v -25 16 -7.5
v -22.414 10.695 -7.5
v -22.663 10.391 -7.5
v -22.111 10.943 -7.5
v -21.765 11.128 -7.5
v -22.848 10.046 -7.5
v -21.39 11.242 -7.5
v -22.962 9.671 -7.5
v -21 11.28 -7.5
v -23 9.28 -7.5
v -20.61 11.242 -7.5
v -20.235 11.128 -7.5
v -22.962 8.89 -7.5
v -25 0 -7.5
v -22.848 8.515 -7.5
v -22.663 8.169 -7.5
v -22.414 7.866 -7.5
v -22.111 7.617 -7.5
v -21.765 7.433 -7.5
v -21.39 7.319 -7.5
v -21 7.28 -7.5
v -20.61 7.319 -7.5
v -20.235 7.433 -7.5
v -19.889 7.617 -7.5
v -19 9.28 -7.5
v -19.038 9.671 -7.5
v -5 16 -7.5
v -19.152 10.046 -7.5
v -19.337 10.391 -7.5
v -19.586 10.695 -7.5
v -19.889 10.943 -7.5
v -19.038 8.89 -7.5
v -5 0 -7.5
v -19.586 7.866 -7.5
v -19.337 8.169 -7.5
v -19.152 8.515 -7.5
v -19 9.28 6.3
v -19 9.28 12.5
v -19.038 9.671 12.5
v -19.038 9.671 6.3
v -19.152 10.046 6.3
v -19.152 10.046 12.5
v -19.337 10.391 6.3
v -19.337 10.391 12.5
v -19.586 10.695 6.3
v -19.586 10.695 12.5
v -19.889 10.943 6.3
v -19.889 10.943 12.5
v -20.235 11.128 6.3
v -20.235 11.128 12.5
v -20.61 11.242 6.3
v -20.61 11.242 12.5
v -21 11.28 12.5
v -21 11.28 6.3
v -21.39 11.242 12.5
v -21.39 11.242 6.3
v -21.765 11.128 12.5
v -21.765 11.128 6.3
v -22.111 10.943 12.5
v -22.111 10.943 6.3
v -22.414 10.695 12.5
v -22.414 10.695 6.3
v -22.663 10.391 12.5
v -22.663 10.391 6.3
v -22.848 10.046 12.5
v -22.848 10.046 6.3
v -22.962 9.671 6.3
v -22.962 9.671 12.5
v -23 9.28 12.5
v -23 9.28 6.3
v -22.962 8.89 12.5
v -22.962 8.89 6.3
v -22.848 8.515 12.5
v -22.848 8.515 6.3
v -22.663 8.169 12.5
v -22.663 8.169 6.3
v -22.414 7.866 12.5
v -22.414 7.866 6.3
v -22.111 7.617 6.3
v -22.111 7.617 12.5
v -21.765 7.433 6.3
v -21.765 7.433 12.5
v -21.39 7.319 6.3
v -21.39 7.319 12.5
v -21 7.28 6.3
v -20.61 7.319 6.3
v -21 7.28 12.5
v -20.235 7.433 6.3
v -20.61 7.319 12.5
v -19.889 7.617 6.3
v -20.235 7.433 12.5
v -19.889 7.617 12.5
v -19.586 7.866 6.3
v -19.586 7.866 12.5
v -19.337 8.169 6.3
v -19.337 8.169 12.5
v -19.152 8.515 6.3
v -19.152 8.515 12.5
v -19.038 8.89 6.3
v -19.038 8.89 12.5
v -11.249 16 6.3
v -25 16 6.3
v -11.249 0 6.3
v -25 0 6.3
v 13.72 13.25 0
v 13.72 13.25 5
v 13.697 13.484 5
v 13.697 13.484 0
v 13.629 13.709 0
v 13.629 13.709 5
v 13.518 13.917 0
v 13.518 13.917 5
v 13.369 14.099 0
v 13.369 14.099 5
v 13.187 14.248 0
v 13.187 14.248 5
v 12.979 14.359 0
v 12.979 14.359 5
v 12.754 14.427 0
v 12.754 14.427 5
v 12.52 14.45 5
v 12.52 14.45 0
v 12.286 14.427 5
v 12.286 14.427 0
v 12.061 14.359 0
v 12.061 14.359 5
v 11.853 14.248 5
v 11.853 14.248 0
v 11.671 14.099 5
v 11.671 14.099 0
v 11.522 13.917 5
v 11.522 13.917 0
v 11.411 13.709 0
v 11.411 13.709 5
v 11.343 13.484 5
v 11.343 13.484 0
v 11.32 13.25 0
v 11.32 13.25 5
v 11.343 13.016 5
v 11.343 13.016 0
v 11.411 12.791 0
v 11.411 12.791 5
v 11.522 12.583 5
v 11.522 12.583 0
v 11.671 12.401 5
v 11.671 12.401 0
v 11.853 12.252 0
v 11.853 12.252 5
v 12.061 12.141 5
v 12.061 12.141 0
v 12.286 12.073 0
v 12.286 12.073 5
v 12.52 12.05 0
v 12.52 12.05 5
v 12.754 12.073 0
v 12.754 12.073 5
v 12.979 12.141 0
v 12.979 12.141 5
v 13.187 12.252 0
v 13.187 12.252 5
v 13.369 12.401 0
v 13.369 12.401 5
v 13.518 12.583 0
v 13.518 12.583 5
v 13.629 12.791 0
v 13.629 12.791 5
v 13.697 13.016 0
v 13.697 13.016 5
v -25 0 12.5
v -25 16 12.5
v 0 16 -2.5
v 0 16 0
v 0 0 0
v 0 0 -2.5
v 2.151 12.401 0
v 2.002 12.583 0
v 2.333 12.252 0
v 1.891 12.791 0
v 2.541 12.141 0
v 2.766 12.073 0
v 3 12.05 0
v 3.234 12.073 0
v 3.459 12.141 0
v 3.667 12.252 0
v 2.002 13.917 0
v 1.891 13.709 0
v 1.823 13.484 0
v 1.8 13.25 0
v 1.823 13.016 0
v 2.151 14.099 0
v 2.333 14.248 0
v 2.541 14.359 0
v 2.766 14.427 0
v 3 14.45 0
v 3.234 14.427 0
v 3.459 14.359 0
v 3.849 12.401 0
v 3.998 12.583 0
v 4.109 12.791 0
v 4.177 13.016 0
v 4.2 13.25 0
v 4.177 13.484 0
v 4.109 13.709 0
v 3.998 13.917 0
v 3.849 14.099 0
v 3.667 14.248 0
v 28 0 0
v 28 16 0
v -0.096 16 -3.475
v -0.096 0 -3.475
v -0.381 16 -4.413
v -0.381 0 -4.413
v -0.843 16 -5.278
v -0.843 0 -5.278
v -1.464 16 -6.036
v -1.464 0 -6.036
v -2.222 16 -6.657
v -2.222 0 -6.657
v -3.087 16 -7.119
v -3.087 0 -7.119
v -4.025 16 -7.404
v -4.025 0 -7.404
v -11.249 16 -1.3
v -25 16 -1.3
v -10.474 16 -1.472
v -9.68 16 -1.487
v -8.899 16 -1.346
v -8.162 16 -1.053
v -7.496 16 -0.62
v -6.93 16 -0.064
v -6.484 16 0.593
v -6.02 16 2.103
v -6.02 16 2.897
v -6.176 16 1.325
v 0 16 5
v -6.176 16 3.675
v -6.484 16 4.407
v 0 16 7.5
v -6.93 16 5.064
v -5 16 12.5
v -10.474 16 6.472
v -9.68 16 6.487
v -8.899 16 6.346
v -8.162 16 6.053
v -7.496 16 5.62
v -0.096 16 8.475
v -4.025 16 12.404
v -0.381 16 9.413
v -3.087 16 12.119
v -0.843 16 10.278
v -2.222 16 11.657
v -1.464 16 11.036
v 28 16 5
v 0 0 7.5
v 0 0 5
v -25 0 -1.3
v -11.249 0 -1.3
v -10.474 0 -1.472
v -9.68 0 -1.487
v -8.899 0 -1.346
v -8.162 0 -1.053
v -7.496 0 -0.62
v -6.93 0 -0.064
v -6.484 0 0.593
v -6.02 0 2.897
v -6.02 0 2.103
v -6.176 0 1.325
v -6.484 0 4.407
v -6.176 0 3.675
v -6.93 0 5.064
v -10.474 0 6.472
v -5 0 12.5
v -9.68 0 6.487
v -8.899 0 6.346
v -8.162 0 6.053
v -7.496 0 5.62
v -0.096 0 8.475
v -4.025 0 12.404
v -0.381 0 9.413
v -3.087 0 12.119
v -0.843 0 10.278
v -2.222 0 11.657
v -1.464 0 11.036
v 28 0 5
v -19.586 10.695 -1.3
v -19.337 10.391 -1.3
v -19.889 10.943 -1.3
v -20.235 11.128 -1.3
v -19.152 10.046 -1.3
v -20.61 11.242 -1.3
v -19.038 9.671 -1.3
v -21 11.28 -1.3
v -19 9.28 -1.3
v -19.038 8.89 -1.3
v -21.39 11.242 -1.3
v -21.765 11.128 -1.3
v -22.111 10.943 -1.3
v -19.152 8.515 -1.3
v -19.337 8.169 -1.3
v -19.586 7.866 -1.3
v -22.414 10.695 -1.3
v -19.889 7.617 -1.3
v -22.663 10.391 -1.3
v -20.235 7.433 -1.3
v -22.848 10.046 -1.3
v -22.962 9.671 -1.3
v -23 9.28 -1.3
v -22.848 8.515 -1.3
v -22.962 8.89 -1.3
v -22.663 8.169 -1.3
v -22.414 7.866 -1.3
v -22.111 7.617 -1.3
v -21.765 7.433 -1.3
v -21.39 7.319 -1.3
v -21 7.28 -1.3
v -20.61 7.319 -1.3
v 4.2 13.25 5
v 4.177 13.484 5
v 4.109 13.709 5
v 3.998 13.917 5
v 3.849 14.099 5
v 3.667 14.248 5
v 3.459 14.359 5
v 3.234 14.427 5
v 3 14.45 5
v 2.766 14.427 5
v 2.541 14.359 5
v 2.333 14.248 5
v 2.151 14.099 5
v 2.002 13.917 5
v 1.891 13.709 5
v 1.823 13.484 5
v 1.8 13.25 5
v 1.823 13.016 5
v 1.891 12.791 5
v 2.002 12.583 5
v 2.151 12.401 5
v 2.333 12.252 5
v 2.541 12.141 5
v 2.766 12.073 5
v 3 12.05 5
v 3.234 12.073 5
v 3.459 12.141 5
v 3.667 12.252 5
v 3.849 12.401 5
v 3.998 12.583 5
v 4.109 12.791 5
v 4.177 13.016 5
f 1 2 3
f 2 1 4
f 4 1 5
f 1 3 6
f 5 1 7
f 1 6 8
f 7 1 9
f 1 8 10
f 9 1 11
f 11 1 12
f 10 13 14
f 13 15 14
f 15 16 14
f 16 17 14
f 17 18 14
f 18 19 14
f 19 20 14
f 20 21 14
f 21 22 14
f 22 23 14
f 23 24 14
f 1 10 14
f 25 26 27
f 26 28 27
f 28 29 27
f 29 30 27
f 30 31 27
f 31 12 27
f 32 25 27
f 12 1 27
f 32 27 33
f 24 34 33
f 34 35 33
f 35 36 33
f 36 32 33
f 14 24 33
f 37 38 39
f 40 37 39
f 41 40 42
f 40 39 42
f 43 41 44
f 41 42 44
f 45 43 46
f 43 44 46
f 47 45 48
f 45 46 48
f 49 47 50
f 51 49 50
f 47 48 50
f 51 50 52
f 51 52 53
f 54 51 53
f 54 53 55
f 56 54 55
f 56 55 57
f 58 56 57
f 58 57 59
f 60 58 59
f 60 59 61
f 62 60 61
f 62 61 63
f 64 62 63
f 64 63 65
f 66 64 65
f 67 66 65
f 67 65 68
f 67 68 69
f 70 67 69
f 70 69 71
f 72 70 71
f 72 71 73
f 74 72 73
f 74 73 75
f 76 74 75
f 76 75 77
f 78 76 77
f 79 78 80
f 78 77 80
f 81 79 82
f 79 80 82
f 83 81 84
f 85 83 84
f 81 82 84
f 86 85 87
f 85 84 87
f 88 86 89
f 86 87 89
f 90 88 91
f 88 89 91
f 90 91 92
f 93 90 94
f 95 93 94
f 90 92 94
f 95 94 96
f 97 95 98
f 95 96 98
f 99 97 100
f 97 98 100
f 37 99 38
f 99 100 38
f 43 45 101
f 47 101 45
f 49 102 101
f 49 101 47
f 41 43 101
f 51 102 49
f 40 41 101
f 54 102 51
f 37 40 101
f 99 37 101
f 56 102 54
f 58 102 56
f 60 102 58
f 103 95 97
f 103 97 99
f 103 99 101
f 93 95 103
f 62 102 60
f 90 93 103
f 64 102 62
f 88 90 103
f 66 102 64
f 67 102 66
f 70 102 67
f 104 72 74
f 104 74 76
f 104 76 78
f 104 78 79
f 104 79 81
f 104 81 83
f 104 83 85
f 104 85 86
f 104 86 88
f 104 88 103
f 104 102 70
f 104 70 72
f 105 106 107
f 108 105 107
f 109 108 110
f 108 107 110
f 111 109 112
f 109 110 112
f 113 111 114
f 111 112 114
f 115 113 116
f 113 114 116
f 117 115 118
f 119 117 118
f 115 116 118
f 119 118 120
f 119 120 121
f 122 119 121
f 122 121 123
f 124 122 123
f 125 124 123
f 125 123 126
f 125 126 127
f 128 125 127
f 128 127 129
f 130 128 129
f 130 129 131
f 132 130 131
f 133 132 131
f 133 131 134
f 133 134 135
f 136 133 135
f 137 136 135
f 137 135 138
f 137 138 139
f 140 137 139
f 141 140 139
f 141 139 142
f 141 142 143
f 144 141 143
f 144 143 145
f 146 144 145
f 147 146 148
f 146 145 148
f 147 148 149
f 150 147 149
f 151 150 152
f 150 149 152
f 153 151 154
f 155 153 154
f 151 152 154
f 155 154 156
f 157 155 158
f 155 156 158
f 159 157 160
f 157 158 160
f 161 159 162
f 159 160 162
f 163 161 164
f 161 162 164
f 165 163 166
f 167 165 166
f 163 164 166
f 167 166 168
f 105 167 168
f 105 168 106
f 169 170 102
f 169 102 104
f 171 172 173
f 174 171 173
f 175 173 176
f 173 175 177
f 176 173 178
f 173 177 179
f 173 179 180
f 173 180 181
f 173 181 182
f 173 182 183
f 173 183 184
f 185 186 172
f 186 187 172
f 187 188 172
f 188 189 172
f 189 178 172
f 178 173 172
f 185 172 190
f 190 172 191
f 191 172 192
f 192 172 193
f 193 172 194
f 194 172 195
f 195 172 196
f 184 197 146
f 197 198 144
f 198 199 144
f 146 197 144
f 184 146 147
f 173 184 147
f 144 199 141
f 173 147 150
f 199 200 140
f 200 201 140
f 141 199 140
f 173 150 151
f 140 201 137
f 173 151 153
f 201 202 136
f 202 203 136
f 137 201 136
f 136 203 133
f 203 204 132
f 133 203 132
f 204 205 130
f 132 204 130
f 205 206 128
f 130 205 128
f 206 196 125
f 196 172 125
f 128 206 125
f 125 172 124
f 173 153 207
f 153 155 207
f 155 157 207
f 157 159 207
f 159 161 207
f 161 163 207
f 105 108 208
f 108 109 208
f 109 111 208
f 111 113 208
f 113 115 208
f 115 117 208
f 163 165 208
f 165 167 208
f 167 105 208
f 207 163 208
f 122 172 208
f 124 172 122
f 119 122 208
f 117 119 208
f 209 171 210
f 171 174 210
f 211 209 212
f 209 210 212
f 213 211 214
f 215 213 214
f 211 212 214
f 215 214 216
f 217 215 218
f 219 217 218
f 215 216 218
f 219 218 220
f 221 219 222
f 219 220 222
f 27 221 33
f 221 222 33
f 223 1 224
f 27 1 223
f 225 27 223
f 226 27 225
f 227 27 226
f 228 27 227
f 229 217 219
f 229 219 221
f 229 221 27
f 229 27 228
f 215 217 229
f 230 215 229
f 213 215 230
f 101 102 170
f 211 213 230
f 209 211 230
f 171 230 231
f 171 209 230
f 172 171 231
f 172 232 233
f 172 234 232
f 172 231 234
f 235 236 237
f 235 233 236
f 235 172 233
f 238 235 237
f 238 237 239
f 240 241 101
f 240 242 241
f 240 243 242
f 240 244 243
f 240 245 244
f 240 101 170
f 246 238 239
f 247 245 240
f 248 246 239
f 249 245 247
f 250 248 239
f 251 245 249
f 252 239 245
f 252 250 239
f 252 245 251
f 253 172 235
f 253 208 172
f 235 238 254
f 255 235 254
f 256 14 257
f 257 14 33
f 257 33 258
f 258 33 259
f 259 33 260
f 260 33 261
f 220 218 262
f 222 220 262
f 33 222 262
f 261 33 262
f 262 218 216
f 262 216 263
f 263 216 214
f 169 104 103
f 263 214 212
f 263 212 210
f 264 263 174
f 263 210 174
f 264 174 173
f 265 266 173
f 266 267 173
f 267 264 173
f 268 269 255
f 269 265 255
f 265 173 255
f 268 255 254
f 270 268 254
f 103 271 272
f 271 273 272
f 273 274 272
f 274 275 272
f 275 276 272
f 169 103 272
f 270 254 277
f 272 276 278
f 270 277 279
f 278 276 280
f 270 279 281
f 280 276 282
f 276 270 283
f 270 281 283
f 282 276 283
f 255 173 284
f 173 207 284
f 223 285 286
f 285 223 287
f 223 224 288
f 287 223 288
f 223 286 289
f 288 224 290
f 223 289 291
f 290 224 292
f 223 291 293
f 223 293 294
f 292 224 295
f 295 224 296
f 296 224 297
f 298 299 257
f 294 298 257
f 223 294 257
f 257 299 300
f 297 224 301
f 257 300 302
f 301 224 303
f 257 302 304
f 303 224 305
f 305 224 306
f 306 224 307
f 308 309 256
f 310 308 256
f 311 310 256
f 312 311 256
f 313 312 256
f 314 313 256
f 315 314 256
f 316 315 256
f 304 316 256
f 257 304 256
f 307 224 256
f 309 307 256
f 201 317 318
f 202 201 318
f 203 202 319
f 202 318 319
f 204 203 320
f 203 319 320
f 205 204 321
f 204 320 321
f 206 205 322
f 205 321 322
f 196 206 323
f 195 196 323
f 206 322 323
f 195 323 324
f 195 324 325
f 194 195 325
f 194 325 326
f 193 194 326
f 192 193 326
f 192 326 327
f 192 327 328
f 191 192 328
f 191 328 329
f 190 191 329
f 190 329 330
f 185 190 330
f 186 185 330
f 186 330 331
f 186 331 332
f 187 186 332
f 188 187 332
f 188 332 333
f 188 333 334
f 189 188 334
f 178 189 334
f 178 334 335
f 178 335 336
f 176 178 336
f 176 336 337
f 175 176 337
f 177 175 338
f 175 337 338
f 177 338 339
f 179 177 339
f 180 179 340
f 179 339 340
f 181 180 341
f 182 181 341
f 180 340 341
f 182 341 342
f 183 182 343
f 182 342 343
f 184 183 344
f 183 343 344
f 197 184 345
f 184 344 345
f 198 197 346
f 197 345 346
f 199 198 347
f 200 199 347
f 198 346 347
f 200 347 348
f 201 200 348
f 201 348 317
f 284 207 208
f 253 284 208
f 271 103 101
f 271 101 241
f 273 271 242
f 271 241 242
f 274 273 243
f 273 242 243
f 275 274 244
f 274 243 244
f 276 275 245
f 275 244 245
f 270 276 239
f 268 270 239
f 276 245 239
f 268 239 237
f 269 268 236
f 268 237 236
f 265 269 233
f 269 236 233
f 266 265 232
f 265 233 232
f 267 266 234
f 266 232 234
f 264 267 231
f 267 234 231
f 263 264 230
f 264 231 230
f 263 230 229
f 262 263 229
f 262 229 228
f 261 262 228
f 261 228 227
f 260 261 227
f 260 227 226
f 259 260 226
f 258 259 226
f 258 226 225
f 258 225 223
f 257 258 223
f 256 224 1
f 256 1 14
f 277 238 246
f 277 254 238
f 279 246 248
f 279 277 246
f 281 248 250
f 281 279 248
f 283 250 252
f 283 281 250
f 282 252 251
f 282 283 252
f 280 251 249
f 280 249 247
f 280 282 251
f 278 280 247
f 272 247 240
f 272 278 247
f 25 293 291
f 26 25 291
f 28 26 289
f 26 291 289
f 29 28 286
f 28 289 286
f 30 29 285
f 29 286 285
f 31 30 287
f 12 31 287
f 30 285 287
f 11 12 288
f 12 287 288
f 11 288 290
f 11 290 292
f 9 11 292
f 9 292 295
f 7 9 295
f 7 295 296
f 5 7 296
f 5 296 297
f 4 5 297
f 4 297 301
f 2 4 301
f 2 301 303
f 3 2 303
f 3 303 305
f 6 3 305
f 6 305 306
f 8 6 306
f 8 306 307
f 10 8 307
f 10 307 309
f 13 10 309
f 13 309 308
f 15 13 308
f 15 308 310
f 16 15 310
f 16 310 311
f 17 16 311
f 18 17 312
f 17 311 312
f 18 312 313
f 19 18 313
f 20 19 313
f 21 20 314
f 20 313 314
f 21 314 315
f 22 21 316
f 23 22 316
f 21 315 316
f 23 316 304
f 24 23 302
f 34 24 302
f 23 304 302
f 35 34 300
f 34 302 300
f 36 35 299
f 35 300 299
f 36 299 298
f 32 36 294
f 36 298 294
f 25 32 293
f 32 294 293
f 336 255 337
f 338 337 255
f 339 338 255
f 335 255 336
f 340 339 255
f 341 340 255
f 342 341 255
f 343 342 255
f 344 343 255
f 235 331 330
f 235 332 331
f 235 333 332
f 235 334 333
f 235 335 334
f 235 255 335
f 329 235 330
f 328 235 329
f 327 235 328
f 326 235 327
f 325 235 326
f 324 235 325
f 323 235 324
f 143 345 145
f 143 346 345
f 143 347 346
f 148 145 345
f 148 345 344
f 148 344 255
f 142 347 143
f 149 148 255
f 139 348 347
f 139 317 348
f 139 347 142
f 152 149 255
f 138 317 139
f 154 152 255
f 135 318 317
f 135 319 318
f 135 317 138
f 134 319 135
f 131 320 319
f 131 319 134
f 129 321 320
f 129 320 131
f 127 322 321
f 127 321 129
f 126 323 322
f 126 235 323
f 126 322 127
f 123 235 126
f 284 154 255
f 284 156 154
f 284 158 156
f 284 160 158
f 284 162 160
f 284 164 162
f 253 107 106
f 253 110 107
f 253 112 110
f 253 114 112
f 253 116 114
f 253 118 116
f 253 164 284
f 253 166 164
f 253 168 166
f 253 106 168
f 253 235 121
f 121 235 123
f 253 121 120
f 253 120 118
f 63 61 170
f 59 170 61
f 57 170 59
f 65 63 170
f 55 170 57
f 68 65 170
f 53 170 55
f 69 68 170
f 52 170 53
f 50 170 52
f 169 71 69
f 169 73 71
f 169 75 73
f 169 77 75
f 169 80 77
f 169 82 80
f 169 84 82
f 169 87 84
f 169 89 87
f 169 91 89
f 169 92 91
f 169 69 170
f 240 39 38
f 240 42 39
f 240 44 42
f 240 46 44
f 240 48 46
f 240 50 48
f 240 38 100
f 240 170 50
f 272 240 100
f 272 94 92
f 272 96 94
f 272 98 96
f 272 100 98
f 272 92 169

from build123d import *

# Parameters (mm, degrees)
F0_W      = 28
F0_H      = 16
F1_DEPTH  = 5
F2_R      = 1.2
F3_DEPTH  = 5.001
F4_W      = 16
F4_H      = 20
F5_DEPTH  = 25
F6_R      = 4
F7_DEPTH  = 16.001
F8_W      = 16
F8_H      = 7.6
F9_DEPTH  = 10
F10_R     = 2
F11_DEPTH = 20.001
F12_DEPTH = 15
F13_R     = 5
F14_R     = 5


with BuildPart() as f1:
    # F0 (on Top) → F1 (new body)
    with BuildSketch(Plane.XY):
        with Locations((14, 8)):
            Rectangle(F0_W, F0_H)
    extrude(amount=F1_DEPTH)

    # F2 (on face) → F3 (cut, through all)
    with BuildSketch(Plane.XY.offset(5)):
        with Locations((12.52, 13.25)):
            Circle(F2_R)
        with Locations((3, 13.25)):
            Circle(F2_R)
    extrude(amount=-F3_DEPTH, mode=Mode.SUBTRACT)

    # F4 (on face) → F5 (join)
    with BuildSketch(Plane(origin=(0, 0, 0), x_dir=(0, -1, 0), z_dir=(-1, 0, 0))):
        with Locations((-8, 2.5)):
            Rectangle(F4_W, F4_H)
    extrude(amount=F5_DEPTH)

    # F6 (on face) → F7 (cut, through all)
    with BuildSketch(Plane(origin=(0, 16, 0), x_dir=(-1, 0, 0), z_dir=(0, 1, 0))):
        with Locations((10, 2.5)):
            Circle(F6_R)
    extrude(amount=-F7_DEPTH, mode=Mode.SUBTRACT)

    # F8 (on face) → F9 (cut)
    with BuildSketch(Plane(origin=(-25, 0, 0), x_dir=(0, -1, 0), z_dir=(-1, 0, 0))):
        with Locations((-8, 2.5)):
            Rectangle(F8_W, F8_H)
    extrude(amount=-F9_DEPTH, mode=Mode.SUBTRACT)

    # F10 (on face) → F11 (cut, through all)
    with BuildSketch(Plane.XY.offset(12.5)):
        with Locations((-21, 9.280348)):
            Circle(F10_R)
    extrude(amount=-F11_DEPTH, mode=Mode.SUBTRACT)

    # F8 (on face) → F12 (cut)
    with BuildSketch(Plane(origin=(-25, 0, 0), x_dir=(0, -1, 0), z_dir=(-1, 0, 0))):
        with Locations((-8, 2.5)):
            Rectangle(F8_W, F8_H)
    extrude(amount=-F12_DEPTH, mode=Mode.SUBTRACT)

    # F13
    f13_edges = [f1.edges().sort_by_distance(p)[0] for p in [
        (0, 8, 12.5),
    ]]
    fillet(f13_edges, radius=F13_R)

    # F14
    f14_edges = [f1.edges().sort_by_distance(p)[0] for p in [
        (0, 8, -7.5),
    ]]
    fillet(f14_edges, radius=F14_R)


solid = f1.part
